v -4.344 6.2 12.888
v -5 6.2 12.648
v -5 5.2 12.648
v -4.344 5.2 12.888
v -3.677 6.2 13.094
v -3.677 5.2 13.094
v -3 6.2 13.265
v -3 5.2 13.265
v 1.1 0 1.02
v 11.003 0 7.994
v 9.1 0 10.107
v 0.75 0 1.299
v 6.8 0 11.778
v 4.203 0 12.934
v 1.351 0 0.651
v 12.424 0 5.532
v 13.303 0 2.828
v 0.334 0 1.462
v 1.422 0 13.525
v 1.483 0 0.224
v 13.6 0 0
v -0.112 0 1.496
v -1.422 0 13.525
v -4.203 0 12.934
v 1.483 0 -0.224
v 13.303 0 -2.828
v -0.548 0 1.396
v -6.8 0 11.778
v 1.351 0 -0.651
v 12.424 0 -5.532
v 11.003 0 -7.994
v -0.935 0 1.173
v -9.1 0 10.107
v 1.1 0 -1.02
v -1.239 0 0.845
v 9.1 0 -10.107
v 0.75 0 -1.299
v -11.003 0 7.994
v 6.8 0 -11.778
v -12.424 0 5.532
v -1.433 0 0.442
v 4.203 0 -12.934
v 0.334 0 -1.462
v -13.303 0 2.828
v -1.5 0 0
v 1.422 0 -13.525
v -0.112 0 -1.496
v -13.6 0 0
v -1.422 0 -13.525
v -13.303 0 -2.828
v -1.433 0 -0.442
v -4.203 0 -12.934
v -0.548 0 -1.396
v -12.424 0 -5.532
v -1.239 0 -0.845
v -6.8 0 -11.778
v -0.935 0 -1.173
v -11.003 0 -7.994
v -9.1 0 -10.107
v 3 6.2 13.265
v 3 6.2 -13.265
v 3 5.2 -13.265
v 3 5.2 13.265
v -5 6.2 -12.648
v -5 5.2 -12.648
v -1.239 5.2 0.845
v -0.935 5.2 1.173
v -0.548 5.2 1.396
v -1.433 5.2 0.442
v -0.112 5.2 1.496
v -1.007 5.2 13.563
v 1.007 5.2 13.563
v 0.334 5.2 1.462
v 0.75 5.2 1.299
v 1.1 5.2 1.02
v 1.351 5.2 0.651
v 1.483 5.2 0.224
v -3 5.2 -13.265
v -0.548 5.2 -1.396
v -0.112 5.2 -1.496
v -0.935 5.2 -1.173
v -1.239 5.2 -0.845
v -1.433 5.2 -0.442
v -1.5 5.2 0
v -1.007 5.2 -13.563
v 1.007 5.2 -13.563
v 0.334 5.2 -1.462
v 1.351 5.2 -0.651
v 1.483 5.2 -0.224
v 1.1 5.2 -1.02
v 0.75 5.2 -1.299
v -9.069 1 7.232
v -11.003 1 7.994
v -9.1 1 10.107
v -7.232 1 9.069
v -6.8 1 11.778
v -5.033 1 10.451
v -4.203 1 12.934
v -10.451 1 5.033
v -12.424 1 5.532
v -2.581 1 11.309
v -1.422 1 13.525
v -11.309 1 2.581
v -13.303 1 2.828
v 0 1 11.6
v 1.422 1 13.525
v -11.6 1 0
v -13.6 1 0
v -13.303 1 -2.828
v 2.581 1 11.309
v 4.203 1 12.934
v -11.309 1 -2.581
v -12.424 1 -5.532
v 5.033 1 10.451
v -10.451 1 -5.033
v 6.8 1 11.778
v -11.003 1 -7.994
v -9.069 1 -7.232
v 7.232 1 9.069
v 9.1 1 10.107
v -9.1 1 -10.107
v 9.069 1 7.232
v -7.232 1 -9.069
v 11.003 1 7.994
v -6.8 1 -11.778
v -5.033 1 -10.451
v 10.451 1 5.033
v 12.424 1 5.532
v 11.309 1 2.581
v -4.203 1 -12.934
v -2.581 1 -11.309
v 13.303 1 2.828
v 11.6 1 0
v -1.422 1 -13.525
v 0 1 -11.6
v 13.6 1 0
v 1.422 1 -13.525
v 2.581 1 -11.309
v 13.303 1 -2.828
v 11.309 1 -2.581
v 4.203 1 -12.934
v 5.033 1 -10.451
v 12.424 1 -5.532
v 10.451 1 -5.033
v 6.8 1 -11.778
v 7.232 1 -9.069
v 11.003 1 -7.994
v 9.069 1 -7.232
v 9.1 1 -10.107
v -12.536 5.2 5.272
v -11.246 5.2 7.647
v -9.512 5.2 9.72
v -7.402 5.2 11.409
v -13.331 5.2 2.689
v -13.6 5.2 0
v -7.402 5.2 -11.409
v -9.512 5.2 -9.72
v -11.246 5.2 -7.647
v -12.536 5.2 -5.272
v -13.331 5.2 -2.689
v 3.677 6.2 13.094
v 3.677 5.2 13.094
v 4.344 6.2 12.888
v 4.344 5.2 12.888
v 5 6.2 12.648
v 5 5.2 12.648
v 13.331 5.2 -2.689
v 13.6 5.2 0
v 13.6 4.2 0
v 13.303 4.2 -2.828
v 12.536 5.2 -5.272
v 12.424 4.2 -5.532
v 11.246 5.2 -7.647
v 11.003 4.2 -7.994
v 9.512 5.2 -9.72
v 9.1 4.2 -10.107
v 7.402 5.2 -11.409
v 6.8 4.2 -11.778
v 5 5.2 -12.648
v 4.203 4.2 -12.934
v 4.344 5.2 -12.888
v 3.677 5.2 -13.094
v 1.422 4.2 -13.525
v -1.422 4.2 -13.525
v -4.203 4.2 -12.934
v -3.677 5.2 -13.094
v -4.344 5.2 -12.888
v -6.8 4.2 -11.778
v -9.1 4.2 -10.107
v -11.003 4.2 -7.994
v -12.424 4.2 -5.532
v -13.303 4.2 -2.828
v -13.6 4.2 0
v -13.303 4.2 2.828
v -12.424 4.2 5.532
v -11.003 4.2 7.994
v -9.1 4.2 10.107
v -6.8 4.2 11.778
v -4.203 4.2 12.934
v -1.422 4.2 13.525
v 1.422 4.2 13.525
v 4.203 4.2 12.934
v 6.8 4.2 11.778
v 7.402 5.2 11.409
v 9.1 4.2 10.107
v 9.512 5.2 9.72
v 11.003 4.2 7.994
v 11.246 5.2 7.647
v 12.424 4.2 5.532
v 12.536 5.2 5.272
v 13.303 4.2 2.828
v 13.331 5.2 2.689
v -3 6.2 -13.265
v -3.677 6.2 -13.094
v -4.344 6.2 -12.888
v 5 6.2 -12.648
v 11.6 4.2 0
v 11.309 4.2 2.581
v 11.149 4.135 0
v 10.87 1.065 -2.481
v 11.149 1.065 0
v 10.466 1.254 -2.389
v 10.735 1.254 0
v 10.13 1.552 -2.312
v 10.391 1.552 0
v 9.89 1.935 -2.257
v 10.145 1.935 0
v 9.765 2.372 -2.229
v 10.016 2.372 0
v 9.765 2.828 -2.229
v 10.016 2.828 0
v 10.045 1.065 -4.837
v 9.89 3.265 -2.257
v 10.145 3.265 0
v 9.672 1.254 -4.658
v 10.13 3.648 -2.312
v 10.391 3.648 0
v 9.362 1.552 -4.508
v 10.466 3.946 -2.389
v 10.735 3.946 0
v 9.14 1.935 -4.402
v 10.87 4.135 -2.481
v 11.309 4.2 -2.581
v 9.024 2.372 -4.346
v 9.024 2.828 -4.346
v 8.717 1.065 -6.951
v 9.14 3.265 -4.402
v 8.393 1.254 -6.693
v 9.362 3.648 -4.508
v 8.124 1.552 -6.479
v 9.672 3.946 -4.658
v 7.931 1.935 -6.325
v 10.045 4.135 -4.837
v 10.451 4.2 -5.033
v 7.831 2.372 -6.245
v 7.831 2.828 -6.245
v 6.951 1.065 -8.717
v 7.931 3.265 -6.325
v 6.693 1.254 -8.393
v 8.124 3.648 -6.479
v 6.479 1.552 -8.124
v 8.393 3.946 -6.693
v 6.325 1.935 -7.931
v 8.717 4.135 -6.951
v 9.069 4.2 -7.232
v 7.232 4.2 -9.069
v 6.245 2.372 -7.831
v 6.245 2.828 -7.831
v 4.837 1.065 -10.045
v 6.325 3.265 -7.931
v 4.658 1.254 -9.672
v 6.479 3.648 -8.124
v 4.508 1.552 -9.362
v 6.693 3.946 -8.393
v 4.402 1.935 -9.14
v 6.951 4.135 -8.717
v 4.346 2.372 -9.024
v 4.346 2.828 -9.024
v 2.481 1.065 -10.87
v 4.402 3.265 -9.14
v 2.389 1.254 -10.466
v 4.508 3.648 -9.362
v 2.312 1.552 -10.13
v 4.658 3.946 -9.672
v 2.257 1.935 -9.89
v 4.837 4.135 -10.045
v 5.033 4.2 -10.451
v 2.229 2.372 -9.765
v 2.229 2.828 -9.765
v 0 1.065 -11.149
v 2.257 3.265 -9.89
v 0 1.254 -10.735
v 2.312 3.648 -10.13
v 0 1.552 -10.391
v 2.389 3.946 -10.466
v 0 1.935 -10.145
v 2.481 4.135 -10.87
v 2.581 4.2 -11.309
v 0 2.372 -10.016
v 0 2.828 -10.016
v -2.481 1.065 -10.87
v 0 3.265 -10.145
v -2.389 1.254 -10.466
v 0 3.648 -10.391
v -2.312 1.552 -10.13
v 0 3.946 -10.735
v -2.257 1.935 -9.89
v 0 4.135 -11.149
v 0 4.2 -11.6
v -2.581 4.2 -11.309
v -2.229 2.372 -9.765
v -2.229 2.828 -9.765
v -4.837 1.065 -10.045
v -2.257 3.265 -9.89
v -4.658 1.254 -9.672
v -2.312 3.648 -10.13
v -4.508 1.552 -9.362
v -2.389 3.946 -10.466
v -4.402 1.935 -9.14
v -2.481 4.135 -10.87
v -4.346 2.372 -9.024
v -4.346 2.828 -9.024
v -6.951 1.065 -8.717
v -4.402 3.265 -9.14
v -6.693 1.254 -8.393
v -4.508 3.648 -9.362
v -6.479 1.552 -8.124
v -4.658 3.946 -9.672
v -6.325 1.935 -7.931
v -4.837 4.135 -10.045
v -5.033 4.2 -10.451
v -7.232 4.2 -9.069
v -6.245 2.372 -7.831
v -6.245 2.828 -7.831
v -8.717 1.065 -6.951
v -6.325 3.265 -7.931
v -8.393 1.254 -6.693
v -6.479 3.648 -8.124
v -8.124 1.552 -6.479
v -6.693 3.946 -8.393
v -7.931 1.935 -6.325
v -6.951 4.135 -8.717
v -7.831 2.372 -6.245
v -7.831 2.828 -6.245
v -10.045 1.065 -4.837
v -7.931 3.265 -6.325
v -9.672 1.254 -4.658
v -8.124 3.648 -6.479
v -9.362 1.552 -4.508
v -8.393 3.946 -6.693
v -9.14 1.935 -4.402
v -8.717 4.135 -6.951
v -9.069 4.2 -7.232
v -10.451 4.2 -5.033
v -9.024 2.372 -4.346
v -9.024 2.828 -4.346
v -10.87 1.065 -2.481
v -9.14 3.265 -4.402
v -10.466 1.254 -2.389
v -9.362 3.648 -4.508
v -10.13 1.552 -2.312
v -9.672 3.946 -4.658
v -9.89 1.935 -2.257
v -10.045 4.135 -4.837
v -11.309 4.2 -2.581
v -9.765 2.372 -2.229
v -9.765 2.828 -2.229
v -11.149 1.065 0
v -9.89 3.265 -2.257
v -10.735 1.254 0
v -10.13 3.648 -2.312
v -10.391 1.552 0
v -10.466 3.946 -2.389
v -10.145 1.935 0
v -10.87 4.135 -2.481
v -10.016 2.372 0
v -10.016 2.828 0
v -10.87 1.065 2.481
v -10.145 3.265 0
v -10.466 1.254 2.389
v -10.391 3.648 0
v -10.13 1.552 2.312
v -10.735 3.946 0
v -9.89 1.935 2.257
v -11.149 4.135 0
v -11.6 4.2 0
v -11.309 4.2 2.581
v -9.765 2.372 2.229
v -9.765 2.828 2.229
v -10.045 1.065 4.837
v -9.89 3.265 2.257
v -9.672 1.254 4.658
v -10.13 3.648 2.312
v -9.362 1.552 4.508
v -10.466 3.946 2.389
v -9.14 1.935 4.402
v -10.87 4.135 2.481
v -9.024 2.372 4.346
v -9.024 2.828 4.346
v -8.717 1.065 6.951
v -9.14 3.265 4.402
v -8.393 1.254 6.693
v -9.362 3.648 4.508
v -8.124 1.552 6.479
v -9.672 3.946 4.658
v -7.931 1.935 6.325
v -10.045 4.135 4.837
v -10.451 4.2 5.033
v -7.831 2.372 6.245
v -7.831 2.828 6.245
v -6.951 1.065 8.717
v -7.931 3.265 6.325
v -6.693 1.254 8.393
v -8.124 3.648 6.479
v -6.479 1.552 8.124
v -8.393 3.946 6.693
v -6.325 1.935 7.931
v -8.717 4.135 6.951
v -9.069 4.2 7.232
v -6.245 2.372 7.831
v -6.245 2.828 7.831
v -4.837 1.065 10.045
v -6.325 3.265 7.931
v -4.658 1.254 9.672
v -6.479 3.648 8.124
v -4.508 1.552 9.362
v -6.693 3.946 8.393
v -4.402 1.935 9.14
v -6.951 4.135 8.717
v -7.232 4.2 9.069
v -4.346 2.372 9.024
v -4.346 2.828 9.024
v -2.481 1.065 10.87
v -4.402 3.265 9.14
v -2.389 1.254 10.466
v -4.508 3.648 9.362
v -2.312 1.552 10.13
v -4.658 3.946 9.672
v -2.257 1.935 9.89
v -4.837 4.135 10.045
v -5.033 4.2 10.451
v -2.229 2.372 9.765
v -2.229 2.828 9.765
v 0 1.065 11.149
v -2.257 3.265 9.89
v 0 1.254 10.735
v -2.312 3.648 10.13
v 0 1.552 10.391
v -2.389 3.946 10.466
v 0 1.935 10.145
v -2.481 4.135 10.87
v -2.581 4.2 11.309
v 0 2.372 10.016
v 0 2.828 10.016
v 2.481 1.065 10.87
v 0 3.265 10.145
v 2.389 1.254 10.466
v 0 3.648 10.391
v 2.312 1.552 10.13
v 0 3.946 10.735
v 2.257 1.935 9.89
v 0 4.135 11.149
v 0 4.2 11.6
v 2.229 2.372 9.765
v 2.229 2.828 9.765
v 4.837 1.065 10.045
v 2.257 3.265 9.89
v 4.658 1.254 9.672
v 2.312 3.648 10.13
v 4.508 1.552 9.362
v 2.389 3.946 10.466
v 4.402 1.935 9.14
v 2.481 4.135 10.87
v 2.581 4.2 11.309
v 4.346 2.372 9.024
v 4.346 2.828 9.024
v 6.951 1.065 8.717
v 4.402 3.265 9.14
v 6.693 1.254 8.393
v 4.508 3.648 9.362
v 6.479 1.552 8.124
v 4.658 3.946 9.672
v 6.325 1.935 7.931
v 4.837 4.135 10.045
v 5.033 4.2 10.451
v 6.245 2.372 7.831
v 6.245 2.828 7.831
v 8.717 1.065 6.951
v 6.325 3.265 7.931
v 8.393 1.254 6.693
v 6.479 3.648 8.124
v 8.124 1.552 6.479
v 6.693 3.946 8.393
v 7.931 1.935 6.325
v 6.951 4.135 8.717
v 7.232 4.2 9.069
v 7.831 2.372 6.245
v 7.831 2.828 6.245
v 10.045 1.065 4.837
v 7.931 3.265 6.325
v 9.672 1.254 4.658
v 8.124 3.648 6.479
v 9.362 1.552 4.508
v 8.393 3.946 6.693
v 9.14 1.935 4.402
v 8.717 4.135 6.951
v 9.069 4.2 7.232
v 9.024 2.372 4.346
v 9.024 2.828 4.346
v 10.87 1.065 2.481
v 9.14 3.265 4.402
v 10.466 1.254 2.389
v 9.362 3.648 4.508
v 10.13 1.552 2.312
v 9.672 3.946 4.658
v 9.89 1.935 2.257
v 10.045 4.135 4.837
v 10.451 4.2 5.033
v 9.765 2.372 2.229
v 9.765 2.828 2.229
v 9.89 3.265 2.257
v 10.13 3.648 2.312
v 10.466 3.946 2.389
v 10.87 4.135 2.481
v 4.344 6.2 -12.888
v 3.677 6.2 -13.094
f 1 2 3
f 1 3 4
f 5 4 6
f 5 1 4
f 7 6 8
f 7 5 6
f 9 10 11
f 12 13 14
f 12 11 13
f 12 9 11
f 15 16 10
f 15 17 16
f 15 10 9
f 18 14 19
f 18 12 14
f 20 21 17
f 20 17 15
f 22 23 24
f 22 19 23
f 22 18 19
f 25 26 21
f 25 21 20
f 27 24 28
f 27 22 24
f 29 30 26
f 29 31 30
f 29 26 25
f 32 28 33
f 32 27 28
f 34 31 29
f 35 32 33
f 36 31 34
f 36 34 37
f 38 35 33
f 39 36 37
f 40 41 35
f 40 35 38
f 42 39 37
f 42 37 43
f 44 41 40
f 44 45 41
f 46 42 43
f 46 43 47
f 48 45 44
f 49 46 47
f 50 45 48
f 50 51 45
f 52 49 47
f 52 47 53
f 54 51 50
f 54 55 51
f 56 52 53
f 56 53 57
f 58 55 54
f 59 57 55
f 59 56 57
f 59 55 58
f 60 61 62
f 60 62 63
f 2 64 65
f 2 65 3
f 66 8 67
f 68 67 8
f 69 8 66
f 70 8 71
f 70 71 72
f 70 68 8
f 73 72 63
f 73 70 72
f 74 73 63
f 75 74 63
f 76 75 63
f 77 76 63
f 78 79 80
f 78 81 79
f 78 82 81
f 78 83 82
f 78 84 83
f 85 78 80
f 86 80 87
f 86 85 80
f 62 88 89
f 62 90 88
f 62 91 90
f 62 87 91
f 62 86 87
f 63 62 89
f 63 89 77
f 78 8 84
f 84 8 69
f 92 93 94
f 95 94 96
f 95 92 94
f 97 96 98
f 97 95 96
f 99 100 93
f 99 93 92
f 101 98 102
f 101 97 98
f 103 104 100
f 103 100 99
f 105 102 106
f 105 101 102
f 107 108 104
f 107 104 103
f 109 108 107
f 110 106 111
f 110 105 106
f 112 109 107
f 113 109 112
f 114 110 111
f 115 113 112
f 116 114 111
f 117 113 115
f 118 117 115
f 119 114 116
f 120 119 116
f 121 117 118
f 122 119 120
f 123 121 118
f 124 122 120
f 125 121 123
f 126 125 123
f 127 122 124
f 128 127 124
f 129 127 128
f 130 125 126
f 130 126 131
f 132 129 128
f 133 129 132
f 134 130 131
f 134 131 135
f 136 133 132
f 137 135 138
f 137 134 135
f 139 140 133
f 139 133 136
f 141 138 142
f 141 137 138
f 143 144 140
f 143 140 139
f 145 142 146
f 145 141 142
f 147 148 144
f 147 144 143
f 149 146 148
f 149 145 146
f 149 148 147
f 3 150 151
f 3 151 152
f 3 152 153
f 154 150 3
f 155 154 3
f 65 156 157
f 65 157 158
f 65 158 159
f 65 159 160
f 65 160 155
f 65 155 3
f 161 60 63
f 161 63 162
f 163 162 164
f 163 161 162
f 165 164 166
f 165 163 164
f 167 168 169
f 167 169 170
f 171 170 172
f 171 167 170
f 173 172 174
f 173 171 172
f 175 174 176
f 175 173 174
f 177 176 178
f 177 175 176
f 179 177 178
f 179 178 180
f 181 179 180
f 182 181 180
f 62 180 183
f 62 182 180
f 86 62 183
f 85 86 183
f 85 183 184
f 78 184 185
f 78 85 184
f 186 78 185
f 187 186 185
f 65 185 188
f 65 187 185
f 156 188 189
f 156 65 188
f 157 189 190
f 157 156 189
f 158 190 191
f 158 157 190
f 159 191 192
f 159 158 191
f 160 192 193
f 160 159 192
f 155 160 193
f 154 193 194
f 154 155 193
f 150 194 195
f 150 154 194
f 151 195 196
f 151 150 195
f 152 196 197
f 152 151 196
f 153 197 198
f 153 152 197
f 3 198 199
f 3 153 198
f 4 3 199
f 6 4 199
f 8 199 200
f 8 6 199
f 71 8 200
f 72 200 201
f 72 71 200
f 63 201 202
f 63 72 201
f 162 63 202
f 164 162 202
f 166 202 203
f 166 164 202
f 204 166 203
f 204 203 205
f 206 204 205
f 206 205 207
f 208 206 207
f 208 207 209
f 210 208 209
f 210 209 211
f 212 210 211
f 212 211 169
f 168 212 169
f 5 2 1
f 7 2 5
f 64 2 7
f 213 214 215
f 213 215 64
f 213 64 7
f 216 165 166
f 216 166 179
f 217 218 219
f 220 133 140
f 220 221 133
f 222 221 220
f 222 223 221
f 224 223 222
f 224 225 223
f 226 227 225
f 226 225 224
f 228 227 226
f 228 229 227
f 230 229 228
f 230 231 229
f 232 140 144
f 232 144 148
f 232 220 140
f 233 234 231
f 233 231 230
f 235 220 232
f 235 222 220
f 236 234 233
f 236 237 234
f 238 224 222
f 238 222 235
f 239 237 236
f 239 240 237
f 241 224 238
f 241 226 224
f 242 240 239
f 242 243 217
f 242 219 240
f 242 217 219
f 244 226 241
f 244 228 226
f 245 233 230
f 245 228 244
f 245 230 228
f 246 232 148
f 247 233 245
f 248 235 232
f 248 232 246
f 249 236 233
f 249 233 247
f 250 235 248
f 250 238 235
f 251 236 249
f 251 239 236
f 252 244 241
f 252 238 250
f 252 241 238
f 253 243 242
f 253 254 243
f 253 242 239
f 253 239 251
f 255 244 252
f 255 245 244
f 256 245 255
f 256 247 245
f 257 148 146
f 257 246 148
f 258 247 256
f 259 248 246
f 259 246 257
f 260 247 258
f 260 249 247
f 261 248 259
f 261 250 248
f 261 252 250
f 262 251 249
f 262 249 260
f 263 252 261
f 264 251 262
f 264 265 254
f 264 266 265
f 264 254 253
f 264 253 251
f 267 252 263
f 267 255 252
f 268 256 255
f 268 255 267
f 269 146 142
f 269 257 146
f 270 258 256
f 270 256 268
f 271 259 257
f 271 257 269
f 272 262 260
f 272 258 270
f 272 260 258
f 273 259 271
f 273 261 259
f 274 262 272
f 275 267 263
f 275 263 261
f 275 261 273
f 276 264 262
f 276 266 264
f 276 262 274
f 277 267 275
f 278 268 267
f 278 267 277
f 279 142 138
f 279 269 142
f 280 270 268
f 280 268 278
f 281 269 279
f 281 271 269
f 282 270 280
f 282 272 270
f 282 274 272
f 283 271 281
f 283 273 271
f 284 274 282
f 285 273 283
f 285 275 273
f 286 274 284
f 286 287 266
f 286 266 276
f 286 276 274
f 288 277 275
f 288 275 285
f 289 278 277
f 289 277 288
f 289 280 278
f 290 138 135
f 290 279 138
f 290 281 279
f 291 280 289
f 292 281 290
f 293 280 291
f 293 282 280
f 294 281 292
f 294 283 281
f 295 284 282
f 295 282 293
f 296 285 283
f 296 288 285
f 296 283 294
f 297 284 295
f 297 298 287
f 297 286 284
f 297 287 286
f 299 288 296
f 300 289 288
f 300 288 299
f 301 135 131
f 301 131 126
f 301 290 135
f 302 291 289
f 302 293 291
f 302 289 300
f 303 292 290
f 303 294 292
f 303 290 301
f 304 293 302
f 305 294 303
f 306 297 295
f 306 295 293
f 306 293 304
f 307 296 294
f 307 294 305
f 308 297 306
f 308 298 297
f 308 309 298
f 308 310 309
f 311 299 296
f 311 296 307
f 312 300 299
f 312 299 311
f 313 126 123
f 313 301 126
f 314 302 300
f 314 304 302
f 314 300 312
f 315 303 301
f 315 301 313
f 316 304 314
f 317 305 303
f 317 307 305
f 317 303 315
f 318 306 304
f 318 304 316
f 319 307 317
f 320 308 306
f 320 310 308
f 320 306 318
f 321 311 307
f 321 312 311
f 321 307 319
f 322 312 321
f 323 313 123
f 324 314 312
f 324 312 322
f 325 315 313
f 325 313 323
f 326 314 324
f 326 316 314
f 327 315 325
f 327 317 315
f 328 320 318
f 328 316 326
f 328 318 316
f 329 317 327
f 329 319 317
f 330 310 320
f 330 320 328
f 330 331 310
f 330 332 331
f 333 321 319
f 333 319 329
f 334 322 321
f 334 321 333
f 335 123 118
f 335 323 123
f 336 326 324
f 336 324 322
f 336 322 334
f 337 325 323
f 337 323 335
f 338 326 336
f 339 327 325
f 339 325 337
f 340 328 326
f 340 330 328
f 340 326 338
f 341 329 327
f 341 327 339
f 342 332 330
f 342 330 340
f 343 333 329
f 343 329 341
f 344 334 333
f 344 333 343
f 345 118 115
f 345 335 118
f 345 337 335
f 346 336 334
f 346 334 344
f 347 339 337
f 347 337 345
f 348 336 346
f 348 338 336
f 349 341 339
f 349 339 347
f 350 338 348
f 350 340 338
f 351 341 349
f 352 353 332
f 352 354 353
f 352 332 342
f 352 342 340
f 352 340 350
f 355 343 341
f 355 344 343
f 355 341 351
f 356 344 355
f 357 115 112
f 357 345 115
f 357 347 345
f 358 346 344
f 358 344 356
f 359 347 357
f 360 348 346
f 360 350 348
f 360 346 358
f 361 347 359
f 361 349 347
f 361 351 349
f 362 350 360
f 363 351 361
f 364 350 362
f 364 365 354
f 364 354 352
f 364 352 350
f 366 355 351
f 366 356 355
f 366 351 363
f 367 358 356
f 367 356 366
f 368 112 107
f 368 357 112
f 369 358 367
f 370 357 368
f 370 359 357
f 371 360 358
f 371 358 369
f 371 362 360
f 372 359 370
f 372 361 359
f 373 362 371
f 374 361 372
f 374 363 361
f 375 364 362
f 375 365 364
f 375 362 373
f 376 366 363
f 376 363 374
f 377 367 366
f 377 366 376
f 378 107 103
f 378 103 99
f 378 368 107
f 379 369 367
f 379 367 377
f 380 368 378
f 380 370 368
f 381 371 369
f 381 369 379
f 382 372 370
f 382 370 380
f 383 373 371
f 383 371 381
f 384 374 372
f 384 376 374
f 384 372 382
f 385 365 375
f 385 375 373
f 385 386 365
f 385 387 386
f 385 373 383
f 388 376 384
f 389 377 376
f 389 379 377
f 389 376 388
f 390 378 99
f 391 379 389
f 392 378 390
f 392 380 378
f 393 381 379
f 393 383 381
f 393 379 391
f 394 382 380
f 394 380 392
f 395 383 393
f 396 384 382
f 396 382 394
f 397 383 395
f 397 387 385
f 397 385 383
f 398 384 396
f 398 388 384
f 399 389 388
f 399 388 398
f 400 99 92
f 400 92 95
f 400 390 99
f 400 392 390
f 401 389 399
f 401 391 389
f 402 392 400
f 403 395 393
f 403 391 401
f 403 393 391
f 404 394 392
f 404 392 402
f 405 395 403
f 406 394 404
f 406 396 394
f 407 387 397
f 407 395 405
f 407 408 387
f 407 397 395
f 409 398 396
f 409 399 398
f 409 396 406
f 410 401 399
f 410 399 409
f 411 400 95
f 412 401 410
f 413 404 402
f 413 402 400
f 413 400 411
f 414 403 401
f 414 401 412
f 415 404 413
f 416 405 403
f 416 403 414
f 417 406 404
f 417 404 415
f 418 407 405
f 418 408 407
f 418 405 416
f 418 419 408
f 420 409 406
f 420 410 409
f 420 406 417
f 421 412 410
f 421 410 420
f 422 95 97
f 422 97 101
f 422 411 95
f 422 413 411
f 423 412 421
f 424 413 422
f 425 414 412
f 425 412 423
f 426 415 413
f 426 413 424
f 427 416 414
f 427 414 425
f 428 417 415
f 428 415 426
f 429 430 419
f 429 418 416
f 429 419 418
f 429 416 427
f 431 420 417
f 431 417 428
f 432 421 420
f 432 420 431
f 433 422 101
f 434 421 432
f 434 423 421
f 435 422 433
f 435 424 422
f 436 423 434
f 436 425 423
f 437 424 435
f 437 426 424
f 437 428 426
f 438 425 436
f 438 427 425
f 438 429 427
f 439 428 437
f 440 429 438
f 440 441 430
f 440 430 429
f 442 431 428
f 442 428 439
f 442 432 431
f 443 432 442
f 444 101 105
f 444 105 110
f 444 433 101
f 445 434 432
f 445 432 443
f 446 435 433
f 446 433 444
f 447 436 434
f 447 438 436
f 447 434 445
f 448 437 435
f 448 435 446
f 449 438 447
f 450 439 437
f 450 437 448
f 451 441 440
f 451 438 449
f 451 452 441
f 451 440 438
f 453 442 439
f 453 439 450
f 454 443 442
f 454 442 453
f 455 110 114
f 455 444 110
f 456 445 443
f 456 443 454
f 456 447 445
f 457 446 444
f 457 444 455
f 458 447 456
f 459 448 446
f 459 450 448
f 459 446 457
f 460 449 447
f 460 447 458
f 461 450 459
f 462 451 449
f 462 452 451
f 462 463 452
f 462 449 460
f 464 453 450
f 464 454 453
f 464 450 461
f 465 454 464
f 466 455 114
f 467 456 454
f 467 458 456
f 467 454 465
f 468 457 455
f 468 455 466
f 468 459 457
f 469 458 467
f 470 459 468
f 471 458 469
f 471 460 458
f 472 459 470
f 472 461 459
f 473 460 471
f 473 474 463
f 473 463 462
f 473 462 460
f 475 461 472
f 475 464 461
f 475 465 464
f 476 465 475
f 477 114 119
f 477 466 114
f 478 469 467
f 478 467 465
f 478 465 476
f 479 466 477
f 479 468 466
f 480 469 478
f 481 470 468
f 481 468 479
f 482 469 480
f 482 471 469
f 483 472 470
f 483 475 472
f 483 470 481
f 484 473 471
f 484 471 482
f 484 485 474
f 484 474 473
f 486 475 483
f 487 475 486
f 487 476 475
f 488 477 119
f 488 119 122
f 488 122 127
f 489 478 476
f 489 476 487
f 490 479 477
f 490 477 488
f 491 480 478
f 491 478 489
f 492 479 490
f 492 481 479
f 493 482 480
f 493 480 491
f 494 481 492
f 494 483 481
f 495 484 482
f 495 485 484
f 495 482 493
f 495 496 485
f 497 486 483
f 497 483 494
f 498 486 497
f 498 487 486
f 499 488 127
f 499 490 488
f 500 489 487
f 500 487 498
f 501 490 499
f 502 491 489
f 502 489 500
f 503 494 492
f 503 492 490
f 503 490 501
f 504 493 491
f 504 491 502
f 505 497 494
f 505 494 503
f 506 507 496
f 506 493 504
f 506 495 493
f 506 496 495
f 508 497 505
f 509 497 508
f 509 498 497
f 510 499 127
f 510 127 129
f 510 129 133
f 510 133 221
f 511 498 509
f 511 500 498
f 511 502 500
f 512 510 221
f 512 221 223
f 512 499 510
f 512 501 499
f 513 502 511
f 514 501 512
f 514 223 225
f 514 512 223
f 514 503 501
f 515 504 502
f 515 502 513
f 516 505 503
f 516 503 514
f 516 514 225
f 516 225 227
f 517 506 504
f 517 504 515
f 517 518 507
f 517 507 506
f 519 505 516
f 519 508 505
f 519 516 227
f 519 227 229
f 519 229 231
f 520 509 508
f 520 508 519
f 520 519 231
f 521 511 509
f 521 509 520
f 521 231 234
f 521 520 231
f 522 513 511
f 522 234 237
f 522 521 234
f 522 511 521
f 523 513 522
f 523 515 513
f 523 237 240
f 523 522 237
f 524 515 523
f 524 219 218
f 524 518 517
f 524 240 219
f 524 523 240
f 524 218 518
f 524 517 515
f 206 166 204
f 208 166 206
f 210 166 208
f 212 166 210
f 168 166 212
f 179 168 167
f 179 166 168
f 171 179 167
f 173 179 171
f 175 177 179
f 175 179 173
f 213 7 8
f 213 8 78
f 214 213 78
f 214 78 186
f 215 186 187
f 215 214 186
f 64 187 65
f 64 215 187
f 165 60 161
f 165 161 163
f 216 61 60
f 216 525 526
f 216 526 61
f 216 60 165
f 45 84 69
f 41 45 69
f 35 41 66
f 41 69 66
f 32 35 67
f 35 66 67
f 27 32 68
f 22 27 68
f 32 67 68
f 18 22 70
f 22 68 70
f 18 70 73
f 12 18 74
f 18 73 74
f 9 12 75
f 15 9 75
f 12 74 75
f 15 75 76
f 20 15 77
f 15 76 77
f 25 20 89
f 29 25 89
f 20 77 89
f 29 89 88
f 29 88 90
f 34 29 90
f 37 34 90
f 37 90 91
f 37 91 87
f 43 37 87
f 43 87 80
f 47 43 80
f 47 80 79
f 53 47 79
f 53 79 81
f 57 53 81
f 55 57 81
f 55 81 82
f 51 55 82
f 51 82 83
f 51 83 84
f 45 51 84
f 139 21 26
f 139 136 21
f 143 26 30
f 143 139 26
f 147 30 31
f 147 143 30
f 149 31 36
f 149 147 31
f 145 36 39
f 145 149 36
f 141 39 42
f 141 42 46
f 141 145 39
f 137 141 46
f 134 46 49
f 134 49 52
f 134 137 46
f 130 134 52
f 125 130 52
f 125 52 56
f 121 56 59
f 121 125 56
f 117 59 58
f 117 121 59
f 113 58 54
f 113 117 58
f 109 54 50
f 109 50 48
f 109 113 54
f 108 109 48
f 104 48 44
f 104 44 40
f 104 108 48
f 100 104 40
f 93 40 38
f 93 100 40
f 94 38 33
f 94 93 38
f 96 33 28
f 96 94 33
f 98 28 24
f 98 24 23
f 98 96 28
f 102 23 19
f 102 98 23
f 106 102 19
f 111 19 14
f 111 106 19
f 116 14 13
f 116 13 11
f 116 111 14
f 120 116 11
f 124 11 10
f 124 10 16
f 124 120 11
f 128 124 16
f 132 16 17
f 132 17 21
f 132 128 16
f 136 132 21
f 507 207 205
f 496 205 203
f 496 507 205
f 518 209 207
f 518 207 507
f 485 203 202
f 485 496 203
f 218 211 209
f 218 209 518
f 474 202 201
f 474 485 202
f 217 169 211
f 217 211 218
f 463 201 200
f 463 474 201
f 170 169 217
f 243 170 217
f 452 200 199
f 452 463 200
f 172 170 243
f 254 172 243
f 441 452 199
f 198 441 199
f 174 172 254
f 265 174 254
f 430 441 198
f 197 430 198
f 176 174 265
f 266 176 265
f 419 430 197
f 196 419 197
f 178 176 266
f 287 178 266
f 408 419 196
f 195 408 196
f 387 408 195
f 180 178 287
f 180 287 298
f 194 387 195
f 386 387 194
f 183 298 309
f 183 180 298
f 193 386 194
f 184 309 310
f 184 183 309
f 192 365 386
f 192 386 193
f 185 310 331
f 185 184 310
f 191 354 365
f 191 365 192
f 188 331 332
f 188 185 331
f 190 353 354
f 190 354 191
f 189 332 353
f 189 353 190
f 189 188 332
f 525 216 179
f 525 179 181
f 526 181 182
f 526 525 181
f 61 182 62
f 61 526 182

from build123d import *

# Parameters (mm, degrees)
SKETCH_2_R          = 1.5
CUT_EXTRUDE_1_DEPTH = 20.923855049
EXTRUDE_START       = 1
EXTRUDE_1_DEPTH     = 1


with BuildPart() as part:
    # ｽｹｯﾁ1 → 回転1 (revolve)
    with BuildSketch(Plane.XY):
        with BuildLine():
            Line((0, 0), (13.6, 0))
            Line((13.6, 0), (13.6, 1))
            Line((13.6, 1), (11.6, 1))
            ThreePointArc((11.6, 1), (10, 2.6), (11.6, 4.2))
            Line((11.6, 4.2), (13.6, 4.2))
            Line((13.6, 4.2), (13.6, 5.2))
            Line((13.6, 5.2), (0, 5.2))
            Line((0, 5.2), (0, 0))
        make_face()
    revolve(axis=Axis((0, 0, 0), (0, 1, 0)))

    # ｽｹｯﾁ2 → ｶｯﾄ - 押し出し1 (cut, through all)
    with BuildSketch(Plane(origin=(0, 5.2, 0), x_dir=(1, 0, 0), z_dir=(0, 1, 0))):
        with Locations(Location((0, 0, 0), (0, 0, 180))):
            Circle(SKETCH_2_R)
    extrude(amount=-CUT_EXTRUDE_1_DEPTH, mode=Mode.SUBTRACT)

    # ｽｹｯﾁ3 → ﾎﾞｽ - 押し出し1 (add)
    with BuildSketch(Plane(origin=(0, 5.2, 0), x_dir=(1, 0, 0), z_dir=(0, 1, 0)).offset(EXTRUDE_START)):
        with BuildLine():
            Line((3, 13.264991519), (3, -13.264991519))
            ThreePointArc((3, -13.264991519), (4.011896667, -12.99479454), (5, -12.647529403))
            Line((5, -12.647529403), (5, 12.647529403))
            ThreePointArc((5, 12.647529403), (4.011896667, 12.99479454), (3, 13.264991519))
        make_face()
        with BuildLine():
            Line((-5, 12.647529403), (-5, -12.647529403))
            ThreePointArc((-5, -12.647529403), (-4.011896667, -12.99479454), (-3, -13.264991519))
            Line((-3, -13.264991519), (-3, 13.264991519))
            ThreePointArc((-3, 13.264991519), (-4.011896667, 12.99479454), (-5, 12.647529403))
        make_face()
    extrude(amount=-EXTRUDE_1_DEPTH)


solid = part.part
